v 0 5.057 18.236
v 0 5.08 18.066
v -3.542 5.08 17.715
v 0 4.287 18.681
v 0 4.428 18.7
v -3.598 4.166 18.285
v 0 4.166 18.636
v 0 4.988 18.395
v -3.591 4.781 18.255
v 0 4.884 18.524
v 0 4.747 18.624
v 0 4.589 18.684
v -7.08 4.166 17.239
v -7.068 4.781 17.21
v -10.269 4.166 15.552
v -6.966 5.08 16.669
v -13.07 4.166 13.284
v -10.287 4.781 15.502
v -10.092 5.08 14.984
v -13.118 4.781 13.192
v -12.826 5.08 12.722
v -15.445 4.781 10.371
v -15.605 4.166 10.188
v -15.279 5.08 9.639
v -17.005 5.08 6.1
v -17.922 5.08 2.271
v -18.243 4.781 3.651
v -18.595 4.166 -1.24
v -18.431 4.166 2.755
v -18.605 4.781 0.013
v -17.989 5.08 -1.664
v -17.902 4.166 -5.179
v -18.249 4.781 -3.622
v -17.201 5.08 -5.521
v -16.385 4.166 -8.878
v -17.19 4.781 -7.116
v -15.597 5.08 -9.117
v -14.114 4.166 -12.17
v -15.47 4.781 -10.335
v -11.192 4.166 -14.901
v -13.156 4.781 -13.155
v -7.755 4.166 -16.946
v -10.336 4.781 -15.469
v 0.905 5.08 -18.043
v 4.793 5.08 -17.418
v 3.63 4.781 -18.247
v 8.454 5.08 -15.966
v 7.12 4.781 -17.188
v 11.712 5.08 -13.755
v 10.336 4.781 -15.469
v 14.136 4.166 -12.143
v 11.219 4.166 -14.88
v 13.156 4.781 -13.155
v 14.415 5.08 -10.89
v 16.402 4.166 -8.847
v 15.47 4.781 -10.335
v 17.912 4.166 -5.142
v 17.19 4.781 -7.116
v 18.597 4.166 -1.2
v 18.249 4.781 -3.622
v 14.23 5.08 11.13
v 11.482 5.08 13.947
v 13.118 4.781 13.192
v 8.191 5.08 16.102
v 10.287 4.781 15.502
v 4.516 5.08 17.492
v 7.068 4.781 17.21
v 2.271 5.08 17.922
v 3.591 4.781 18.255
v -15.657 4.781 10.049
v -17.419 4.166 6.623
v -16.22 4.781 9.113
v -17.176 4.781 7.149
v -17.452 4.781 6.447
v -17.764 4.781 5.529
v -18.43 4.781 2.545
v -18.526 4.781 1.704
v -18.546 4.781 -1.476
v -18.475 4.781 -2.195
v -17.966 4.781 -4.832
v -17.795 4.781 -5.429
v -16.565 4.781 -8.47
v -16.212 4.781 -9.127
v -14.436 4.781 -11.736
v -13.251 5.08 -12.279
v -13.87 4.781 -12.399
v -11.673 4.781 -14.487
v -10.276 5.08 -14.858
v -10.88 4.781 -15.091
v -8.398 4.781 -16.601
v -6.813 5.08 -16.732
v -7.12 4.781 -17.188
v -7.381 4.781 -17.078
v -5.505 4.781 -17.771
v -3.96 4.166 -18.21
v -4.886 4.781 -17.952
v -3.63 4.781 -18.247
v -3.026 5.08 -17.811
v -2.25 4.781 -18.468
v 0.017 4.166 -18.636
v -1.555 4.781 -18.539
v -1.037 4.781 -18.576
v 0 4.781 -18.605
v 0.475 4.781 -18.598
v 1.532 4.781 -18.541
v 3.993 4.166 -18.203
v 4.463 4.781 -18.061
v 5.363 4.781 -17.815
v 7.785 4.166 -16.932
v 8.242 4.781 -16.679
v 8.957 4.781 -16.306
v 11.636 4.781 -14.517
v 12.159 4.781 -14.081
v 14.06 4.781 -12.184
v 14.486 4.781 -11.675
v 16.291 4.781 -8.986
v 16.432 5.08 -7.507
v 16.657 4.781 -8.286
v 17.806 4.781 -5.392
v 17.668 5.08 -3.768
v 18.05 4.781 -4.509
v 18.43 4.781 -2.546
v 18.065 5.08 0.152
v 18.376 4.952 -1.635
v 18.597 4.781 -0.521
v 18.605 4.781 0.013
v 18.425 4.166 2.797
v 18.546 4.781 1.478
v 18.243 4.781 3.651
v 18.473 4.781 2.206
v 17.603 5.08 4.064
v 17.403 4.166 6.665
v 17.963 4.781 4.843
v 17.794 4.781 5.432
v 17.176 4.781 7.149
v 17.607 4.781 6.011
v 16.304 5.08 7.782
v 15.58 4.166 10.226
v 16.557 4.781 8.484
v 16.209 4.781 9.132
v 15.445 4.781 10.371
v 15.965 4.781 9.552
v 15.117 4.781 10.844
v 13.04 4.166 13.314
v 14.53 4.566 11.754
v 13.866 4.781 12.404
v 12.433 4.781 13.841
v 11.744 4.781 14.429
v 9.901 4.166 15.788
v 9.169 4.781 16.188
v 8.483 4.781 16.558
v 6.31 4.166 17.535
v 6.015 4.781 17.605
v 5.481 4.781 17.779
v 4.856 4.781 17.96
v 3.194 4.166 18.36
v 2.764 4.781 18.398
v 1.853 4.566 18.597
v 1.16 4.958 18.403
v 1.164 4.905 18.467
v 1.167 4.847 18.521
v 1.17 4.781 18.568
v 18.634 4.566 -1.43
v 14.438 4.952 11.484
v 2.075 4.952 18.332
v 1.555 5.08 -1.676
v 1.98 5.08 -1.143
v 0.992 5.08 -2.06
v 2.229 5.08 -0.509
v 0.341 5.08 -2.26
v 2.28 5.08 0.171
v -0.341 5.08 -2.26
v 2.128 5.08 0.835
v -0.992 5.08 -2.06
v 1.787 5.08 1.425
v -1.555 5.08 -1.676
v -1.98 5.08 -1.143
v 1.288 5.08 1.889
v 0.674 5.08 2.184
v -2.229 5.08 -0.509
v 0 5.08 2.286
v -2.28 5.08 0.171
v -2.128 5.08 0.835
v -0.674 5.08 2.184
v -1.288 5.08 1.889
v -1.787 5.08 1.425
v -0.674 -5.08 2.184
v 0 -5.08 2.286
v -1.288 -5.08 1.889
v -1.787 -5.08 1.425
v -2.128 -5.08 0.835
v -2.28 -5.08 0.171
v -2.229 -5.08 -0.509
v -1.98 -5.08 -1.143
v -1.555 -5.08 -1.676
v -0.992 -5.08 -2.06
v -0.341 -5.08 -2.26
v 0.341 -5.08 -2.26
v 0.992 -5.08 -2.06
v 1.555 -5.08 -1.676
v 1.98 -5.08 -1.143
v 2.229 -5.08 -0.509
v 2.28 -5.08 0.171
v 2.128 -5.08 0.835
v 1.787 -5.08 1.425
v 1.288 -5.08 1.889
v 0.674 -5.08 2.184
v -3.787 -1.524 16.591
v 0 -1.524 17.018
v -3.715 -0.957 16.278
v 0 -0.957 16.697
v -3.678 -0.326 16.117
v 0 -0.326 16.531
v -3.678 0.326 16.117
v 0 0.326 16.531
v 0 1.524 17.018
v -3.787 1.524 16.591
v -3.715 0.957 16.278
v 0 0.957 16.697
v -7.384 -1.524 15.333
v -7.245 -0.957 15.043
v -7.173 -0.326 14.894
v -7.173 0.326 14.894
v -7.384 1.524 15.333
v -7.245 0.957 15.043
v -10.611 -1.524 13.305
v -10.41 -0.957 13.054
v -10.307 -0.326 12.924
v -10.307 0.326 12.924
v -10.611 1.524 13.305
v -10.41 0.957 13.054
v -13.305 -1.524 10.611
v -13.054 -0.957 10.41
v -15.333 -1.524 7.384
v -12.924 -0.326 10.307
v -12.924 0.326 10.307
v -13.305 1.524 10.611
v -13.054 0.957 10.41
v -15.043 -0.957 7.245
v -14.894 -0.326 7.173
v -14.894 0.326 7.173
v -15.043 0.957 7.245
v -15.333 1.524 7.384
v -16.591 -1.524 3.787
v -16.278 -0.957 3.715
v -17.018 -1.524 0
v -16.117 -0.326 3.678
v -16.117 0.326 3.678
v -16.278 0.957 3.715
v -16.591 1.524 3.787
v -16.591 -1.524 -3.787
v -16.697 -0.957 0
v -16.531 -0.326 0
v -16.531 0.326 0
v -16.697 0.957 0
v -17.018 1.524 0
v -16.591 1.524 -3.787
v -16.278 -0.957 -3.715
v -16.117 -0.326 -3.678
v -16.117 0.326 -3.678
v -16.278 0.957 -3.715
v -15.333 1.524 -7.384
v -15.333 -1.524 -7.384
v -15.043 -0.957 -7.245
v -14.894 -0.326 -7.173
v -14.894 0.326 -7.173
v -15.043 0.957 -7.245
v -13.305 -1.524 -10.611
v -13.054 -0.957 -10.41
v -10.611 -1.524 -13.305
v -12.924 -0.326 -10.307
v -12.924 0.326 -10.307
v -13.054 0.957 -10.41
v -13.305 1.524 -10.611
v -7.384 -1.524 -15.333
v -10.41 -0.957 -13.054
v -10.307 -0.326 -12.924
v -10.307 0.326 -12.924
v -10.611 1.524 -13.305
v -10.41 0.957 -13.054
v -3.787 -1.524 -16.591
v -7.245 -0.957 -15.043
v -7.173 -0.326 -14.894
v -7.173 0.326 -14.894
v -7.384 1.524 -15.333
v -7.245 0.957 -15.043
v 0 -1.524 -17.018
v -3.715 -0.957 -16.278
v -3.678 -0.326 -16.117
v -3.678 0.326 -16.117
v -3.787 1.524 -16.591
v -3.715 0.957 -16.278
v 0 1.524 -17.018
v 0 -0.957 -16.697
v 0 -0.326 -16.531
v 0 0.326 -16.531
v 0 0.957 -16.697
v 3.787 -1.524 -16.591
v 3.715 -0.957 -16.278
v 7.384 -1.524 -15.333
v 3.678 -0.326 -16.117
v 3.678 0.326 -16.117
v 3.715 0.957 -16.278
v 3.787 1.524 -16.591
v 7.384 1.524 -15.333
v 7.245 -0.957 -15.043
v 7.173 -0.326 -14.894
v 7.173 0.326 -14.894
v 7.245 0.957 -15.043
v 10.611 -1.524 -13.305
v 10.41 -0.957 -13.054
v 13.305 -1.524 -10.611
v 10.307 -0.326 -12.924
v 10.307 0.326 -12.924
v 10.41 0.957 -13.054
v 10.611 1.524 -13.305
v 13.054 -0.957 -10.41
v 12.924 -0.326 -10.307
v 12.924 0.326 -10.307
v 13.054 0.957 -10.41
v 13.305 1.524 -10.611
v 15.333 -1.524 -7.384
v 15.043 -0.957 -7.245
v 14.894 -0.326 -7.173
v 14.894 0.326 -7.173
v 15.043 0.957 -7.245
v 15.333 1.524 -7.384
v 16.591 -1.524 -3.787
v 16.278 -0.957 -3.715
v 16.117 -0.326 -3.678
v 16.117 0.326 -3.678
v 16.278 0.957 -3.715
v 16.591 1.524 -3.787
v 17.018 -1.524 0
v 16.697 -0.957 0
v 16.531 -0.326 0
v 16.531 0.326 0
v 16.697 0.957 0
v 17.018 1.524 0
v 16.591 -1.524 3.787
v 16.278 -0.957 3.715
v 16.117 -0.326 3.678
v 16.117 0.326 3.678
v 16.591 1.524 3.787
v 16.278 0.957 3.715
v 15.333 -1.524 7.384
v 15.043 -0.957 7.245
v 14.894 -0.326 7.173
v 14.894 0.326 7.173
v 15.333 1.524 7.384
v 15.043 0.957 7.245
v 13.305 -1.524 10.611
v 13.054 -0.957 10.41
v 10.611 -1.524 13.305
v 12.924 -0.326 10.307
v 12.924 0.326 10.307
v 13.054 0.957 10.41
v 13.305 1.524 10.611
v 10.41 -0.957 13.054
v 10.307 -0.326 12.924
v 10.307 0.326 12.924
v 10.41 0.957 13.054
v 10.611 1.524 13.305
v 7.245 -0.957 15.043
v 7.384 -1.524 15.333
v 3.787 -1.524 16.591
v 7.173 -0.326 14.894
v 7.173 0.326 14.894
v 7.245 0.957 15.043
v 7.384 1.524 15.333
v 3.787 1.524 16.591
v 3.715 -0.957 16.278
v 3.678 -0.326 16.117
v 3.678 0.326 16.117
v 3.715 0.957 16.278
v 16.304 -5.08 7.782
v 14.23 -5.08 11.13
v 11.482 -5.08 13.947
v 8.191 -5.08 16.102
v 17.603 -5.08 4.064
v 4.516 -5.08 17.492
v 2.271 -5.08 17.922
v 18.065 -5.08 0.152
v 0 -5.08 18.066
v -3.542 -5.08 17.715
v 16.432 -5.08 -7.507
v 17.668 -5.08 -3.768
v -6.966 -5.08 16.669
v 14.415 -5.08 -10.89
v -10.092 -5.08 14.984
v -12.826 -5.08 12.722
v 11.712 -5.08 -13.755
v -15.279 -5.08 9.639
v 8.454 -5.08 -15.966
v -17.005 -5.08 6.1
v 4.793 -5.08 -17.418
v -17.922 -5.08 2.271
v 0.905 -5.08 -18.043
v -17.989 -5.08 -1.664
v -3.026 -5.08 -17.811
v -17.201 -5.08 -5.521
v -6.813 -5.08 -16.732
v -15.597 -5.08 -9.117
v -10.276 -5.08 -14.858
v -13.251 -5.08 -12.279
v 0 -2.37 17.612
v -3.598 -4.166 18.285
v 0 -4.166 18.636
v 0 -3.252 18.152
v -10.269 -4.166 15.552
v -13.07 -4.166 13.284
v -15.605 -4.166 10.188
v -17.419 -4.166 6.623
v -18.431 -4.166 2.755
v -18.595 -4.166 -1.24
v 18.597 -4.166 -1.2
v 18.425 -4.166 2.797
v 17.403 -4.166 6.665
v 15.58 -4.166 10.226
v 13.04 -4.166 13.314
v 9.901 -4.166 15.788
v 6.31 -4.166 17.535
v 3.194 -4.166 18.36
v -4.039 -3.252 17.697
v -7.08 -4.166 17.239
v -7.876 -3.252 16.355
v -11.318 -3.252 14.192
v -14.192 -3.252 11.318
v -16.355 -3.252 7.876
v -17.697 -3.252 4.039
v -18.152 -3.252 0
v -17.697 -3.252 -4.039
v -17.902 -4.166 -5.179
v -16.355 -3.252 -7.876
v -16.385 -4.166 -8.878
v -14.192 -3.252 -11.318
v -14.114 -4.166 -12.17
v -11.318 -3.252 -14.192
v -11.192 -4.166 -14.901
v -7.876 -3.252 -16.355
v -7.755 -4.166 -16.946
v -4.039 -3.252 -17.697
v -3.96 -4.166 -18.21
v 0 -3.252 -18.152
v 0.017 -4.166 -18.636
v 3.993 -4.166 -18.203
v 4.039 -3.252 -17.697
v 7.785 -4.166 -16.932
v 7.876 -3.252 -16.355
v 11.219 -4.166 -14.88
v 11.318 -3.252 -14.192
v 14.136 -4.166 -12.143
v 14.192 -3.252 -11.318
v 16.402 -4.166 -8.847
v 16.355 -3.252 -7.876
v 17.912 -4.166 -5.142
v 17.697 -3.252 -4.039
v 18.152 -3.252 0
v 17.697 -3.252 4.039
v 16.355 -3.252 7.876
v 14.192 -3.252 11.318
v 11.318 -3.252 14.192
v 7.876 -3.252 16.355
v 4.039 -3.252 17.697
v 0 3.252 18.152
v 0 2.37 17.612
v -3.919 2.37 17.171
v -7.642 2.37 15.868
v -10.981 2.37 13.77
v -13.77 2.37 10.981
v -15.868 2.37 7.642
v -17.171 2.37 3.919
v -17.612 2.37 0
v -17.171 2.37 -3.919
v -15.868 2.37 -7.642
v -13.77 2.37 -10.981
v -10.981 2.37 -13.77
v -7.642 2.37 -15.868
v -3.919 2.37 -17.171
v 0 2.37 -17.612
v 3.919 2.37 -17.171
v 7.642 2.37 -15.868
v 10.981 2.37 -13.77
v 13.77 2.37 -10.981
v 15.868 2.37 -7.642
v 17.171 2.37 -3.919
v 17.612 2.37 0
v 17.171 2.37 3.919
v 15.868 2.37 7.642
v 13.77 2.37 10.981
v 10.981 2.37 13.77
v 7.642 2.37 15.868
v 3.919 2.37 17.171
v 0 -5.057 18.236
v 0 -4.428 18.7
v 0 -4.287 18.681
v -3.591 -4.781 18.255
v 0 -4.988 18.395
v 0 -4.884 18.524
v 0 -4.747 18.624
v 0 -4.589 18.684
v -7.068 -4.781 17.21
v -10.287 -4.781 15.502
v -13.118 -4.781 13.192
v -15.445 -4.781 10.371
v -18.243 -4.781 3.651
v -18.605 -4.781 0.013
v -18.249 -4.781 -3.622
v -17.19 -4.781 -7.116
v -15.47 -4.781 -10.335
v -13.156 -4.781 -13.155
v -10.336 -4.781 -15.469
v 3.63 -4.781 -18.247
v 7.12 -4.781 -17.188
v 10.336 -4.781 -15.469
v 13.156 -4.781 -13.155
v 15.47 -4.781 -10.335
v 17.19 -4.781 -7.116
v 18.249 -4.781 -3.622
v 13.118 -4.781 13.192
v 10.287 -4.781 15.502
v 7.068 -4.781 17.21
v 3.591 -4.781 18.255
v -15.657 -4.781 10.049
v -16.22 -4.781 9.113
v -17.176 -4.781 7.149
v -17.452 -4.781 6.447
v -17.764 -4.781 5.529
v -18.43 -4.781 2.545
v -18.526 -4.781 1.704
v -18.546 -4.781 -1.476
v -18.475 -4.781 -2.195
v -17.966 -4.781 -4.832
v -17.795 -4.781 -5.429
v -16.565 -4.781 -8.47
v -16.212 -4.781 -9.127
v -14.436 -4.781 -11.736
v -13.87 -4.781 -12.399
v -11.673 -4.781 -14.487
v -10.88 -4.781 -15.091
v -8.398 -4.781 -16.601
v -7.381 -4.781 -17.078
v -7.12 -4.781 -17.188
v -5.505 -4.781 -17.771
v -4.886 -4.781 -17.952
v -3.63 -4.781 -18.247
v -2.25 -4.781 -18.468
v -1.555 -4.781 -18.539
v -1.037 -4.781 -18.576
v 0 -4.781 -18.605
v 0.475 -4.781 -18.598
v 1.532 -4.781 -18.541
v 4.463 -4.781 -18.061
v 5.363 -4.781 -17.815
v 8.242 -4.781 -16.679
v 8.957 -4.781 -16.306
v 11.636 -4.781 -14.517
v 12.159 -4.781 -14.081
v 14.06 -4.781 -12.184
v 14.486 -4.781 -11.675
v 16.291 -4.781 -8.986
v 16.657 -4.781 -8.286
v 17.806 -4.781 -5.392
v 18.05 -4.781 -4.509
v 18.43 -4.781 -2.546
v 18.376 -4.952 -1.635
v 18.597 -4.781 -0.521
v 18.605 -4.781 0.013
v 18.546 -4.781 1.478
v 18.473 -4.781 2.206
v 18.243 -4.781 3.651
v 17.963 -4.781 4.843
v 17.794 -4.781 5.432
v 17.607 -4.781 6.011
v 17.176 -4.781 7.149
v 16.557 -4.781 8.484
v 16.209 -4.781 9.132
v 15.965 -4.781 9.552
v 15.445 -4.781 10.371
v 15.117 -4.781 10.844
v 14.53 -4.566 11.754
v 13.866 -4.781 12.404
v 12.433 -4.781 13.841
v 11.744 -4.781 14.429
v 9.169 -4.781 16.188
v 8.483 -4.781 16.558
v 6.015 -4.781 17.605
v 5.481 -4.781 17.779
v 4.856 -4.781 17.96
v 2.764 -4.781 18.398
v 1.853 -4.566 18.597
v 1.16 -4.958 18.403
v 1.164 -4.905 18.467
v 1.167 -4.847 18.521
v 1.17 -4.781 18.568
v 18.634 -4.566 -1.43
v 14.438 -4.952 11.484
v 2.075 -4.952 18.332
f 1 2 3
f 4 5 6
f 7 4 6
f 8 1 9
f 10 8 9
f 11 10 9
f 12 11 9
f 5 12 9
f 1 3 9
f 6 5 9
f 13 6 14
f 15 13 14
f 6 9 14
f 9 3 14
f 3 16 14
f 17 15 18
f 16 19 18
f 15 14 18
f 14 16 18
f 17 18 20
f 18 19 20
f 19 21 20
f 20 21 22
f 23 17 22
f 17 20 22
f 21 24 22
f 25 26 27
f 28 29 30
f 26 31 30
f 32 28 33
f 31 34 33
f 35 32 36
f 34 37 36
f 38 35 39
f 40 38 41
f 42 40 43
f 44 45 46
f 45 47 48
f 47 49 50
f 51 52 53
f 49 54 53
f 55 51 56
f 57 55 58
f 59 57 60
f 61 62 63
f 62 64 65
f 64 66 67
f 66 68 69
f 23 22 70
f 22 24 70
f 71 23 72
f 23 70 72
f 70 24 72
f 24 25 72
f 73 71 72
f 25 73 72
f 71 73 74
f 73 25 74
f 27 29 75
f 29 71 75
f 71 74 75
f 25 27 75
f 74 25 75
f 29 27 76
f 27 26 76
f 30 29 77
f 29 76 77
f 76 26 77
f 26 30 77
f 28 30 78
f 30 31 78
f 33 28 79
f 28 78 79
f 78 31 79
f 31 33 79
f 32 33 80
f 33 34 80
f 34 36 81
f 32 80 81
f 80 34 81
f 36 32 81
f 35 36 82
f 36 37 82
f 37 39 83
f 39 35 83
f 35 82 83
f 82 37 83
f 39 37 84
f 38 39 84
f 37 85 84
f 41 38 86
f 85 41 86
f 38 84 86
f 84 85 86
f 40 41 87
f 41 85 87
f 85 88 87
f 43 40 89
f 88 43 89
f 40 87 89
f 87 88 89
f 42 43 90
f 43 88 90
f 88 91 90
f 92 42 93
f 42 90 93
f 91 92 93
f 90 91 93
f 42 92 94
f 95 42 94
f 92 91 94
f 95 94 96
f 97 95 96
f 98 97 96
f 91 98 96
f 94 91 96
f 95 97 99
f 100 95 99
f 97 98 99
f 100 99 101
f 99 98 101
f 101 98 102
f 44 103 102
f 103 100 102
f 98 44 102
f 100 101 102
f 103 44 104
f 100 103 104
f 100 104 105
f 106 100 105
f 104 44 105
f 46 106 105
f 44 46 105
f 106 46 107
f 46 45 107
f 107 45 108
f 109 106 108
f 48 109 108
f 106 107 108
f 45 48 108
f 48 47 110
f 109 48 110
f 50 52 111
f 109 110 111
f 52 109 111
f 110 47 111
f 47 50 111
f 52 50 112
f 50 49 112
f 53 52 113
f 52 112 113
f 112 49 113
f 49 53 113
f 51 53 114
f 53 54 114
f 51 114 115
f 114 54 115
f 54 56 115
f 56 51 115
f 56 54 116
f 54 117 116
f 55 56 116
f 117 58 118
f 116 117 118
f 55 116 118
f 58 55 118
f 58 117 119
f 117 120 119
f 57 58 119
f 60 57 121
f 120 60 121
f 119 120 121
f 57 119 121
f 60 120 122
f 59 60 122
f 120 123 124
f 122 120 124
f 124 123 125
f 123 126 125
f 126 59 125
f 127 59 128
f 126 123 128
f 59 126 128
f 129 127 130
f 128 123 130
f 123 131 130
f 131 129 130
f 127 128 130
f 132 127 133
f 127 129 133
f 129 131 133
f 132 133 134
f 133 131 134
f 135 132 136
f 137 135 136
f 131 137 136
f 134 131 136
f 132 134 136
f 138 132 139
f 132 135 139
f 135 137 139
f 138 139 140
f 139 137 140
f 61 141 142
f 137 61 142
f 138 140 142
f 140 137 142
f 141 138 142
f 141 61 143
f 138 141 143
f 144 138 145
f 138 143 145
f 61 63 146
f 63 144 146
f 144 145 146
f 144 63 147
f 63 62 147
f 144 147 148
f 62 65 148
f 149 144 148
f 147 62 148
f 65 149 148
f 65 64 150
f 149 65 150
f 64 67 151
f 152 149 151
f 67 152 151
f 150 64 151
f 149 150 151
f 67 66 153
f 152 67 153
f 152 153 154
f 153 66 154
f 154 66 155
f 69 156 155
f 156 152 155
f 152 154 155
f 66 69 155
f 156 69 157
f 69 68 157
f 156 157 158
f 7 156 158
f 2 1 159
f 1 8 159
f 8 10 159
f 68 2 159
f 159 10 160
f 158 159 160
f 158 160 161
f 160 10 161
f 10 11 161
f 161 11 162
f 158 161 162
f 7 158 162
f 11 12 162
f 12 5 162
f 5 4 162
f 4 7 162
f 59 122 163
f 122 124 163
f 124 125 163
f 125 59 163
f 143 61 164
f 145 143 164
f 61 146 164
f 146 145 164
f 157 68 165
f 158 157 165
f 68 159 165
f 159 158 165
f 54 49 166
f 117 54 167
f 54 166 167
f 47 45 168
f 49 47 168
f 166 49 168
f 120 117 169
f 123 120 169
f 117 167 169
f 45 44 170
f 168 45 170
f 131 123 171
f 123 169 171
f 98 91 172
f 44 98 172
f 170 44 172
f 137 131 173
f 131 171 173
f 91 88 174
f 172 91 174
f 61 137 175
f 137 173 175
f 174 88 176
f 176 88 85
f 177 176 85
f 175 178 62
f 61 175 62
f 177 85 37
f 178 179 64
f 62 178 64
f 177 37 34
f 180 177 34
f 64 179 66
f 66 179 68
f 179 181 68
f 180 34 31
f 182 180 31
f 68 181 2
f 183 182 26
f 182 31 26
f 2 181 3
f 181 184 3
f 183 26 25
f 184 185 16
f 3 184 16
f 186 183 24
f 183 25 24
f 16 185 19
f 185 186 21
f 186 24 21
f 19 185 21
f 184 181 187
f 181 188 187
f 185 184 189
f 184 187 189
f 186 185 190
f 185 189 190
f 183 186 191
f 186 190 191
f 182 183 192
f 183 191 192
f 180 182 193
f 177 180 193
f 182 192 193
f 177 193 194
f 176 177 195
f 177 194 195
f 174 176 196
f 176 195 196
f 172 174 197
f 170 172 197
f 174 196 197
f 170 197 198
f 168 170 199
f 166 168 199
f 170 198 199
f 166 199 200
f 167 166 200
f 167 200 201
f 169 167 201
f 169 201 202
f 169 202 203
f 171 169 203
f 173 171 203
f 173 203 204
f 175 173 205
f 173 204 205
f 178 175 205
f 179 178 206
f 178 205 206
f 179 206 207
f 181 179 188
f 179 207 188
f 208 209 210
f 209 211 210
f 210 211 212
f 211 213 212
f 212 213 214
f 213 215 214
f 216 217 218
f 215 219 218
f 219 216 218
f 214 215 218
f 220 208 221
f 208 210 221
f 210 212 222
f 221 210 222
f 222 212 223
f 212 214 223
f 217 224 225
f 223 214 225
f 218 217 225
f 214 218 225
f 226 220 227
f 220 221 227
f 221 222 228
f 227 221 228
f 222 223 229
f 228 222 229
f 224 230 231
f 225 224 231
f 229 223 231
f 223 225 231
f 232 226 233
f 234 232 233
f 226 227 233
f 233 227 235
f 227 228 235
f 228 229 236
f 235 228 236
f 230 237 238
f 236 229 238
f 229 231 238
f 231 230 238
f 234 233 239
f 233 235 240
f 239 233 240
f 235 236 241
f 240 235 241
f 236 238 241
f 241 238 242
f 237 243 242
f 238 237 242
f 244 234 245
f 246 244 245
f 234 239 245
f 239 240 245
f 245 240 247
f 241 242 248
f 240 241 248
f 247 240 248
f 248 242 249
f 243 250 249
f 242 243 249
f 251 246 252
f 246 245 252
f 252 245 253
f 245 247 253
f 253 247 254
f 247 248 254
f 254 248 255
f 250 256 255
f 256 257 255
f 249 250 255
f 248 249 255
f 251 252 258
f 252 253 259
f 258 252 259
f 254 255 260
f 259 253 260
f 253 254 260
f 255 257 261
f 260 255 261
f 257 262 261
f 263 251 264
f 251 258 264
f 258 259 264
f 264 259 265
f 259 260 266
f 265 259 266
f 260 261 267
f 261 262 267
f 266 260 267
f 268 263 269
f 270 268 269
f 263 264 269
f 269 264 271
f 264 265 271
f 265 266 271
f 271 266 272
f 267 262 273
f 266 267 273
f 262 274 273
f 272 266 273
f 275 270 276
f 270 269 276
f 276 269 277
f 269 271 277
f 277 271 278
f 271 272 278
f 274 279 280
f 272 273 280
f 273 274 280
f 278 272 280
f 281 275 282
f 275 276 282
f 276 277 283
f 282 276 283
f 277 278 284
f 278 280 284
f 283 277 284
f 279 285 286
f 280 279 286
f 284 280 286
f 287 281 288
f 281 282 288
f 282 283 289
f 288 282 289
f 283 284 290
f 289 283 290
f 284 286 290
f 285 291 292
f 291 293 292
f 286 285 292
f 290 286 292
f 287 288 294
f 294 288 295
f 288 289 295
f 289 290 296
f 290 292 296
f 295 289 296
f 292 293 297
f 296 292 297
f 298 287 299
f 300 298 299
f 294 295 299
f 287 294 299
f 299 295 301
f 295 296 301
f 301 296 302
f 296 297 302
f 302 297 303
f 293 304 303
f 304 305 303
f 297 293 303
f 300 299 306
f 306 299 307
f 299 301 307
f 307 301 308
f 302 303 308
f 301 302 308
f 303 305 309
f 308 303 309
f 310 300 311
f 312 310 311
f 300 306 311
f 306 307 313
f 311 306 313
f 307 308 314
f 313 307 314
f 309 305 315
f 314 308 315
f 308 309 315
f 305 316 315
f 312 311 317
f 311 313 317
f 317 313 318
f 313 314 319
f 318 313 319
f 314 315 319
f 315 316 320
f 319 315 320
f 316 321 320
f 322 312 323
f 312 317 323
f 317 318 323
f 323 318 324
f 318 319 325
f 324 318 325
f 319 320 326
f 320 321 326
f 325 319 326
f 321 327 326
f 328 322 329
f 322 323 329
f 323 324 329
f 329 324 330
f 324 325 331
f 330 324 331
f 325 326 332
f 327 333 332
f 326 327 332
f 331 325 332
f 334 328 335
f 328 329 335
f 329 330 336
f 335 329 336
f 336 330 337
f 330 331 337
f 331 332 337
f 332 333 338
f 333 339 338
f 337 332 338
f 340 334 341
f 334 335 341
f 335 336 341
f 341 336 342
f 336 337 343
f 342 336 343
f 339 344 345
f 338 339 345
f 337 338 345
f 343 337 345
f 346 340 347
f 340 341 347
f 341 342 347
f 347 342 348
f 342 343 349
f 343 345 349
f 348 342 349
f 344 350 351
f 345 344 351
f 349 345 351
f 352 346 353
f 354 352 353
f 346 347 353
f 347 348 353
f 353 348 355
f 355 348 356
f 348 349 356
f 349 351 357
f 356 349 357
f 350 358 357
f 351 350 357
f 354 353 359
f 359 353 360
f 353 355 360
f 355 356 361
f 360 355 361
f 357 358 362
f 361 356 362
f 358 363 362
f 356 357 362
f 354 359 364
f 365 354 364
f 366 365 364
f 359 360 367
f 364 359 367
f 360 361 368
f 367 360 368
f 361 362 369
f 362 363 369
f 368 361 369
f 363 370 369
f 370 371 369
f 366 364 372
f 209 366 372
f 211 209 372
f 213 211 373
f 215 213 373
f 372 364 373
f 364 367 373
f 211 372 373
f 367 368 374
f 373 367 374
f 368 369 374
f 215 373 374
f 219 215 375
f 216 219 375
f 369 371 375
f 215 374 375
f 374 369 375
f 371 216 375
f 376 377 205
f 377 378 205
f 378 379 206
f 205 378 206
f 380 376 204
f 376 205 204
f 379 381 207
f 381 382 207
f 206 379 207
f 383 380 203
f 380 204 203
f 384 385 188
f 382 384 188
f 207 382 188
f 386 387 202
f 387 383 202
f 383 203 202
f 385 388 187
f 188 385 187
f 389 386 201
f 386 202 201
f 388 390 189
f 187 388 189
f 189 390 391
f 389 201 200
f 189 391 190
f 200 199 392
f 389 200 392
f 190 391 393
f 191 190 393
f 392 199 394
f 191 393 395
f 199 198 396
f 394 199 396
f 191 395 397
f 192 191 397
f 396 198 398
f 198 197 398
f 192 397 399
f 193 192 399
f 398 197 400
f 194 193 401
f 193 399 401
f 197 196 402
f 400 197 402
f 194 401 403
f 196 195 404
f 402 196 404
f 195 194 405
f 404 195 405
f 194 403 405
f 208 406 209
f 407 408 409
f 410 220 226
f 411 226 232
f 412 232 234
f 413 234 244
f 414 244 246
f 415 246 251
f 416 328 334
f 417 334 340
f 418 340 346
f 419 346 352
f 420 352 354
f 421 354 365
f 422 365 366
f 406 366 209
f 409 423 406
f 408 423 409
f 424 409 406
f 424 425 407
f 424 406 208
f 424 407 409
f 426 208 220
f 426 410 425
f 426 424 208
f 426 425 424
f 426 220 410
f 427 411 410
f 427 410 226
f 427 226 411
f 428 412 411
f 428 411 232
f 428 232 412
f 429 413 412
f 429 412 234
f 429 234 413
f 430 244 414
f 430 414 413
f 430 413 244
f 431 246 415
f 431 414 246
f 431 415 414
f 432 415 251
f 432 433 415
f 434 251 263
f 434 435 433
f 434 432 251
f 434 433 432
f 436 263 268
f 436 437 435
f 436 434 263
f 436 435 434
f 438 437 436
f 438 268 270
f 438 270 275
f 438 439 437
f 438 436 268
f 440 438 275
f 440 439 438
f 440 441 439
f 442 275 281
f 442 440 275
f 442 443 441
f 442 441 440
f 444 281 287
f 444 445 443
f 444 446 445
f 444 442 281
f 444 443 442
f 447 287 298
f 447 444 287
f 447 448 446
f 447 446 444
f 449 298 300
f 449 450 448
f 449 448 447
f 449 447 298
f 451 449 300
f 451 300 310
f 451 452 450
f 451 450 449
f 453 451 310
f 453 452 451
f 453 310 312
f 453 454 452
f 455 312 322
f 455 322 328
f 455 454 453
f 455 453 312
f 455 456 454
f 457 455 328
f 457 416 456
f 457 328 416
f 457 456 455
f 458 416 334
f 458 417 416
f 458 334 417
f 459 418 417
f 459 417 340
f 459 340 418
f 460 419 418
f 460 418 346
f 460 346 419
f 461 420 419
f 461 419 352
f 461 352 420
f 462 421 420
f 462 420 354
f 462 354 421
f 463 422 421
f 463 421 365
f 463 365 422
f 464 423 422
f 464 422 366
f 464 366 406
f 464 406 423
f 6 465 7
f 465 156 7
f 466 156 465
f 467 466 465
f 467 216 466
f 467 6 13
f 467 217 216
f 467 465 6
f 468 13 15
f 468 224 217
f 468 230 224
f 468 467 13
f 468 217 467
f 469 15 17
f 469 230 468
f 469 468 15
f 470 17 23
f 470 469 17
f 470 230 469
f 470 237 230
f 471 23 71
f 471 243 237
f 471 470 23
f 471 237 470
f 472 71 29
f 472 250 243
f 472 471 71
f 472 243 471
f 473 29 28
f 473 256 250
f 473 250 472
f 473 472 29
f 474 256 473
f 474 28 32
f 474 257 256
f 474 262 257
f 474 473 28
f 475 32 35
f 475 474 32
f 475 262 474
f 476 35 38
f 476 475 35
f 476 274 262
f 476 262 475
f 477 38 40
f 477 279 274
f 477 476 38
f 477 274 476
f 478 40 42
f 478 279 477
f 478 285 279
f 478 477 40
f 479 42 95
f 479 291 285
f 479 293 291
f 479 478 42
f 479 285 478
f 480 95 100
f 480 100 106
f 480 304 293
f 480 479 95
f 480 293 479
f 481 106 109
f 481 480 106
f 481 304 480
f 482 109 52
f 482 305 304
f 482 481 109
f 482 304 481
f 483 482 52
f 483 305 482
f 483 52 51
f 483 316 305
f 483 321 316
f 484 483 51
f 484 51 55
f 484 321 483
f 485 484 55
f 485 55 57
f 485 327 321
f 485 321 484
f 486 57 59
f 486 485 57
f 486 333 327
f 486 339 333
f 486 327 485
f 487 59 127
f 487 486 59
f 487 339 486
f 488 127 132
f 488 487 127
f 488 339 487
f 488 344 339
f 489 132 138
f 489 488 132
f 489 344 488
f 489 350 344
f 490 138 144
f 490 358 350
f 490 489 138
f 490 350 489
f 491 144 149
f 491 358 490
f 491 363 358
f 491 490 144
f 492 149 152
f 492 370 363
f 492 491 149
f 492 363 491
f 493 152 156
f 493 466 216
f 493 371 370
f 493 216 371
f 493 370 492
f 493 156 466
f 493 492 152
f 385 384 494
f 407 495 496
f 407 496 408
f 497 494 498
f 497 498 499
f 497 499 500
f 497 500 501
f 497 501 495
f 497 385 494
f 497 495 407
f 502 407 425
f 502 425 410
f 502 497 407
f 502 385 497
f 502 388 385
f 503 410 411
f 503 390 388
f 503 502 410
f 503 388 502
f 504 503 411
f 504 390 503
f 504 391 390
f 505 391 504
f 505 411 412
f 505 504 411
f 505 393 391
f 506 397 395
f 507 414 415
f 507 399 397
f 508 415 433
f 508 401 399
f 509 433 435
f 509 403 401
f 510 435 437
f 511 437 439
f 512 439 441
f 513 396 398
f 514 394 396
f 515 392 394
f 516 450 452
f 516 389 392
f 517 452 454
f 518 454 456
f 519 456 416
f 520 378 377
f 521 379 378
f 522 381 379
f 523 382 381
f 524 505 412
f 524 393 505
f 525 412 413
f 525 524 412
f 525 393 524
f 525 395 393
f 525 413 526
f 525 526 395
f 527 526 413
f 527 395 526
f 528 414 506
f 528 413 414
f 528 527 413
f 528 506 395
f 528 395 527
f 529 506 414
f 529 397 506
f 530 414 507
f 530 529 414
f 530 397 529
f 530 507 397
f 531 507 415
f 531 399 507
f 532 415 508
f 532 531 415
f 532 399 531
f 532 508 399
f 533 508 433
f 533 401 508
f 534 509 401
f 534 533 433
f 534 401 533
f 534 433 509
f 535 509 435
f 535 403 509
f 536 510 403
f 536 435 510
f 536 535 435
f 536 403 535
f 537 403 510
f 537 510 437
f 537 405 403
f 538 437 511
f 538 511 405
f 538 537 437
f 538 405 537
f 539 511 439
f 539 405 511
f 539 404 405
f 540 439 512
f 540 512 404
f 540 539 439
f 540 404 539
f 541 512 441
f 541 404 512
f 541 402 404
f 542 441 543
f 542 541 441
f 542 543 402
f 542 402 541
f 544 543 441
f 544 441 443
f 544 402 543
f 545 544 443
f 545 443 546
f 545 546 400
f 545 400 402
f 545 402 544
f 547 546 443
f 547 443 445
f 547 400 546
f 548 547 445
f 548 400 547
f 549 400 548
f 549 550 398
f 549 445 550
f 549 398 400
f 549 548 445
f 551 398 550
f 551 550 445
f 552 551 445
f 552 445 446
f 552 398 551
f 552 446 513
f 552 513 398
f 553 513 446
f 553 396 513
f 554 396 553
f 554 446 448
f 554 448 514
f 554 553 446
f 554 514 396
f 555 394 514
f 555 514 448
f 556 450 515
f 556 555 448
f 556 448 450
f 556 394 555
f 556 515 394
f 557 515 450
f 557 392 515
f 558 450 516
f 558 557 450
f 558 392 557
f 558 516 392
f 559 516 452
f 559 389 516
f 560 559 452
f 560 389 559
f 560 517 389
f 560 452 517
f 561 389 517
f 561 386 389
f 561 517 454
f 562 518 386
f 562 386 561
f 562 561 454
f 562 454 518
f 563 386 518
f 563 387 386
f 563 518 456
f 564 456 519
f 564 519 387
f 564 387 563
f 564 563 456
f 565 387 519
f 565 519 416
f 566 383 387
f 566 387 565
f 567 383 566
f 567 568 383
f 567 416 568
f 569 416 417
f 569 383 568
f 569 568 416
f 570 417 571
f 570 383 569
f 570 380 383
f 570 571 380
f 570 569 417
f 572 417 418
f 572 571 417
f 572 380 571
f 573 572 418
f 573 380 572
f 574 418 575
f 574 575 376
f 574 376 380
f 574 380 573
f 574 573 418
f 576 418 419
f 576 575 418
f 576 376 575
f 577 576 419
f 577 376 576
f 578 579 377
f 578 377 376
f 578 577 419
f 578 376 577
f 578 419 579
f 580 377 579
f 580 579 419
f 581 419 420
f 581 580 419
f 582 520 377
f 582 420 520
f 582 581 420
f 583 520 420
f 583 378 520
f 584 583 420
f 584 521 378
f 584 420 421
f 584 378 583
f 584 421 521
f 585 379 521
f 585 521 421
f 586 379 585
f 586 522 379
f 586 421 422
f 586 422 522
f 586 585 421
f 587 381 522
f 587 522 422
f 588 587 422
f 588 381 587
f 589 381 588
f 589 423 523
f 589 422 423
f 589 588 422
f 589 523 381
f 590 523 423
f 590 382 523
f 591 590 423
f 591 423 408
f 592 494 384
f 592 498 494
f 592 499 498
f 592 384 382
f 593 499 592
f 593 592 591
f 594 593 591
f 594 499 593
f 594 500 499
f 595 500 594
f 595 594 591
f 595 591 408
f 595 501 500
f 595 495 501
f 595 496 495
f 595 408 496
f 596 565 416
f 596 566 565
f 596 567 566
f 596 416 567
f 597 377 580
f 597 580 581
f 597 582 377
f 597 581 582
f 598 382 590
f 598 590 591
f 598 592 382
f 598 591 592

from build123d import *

# Parameters (mm, degrees)
FILLET1_R = 16.51
FILLET2_R = 0.635


with BuildPart() as part:
    # Sketch1 → Revolve1 (revolve)
    with BuildSketch(Plane.XY, mode=Mode.PRIVATE) as revolve1_sk:
        with BuildLine():
            Line((2.286, 5.08), (2.286, -5.08))
            Line((2.286, -5.08), (19.05, -5.08))
            Line((19.05, -5.08), (19.05, -2.54))
            ThreePointArc((19.05, -2.54), (16.51, 0), (19.05, 2.54))
            Line((19.05, 2.54), (19.05, 5.08))
            Line((19.05, 5.08), (2.286, 5.08))
        make_face()
    revolve(revolve1_sk.sketch.rotate(Axis((0, 5.08, 0), (0, -1, 0)), 90), axis=Axis((0, 5.08, 0), (0, -1, 0)))

    # Fillet1
    # the kernel refuses this fillet: 16.51 mm, written as the material it takes off along each edge
    with BuildSketch(Plane(origin=(0, 2.54, 0), x_dir=(0, 0, 1), z_dir=(1, 0, 0))) as fillet1_piece_1:
        with BuildLine():
            CenterArc((3.81, -8.89), FILLET1_R, 22.619864948, 14.250032698)
            Line((19.05, -2.54), (19.3548, -2.413))
            ThreePointArc((19.3548, -2.413), (19.3802, -1.27), (19.3802, 0))
            Line((19.3802, 0), (19.05, 0.3302))
            ThreePointArc((19.05, 0.3302), (18.061747397, 0.563494793), (17.28216, 1.21412))
            Line((17.28216, 1.21412), (17.018, 1.016))
        make_face()
    revolve(axis=Axis((0, 2.54, 0), (0, -1, 0)), mode=Mode.SUBTRACT)
    with BuildSketch(Plane(origin=(0, -2.54, 0), x_dir=(0, 0, 1), z_dir=(1, 0, 0))) as fillet1_piece_2:
        with BuildLine():
            CenterArc((3.81, 8.89), FILLET1_R, 323.130102354, 14.250032698)
            Line((17.018, -1.016), (17.28216, -1.21412))
            ThreePointArc((17.28216, -1.21412), (18.061747397, -0.563494793), (19.05, -0.3302))
            Line((19.05, -0.3302), (19.3802, 0))
            ThreePointArc((19.3802, 0), (19.3802, 1.27), (19.3548, 2.413))
            Line((19.3548, 2.413), (19.05, 2.54))
        make_face()
    revolve(axis=Axis((0, -2.54, 0), (0, -1, 0)), mode=Mode.SUBTRACT)

    # Fillet2
    fillet2_edges = [part.edges().sort_by_distance(p)[0] for p in [
        (0, 5.08, -19.05),
        (0, -5.08, -19.05),
    ]]
    fillet(fillet2_edges, radius=FILLET2_R)


solid = part.part
